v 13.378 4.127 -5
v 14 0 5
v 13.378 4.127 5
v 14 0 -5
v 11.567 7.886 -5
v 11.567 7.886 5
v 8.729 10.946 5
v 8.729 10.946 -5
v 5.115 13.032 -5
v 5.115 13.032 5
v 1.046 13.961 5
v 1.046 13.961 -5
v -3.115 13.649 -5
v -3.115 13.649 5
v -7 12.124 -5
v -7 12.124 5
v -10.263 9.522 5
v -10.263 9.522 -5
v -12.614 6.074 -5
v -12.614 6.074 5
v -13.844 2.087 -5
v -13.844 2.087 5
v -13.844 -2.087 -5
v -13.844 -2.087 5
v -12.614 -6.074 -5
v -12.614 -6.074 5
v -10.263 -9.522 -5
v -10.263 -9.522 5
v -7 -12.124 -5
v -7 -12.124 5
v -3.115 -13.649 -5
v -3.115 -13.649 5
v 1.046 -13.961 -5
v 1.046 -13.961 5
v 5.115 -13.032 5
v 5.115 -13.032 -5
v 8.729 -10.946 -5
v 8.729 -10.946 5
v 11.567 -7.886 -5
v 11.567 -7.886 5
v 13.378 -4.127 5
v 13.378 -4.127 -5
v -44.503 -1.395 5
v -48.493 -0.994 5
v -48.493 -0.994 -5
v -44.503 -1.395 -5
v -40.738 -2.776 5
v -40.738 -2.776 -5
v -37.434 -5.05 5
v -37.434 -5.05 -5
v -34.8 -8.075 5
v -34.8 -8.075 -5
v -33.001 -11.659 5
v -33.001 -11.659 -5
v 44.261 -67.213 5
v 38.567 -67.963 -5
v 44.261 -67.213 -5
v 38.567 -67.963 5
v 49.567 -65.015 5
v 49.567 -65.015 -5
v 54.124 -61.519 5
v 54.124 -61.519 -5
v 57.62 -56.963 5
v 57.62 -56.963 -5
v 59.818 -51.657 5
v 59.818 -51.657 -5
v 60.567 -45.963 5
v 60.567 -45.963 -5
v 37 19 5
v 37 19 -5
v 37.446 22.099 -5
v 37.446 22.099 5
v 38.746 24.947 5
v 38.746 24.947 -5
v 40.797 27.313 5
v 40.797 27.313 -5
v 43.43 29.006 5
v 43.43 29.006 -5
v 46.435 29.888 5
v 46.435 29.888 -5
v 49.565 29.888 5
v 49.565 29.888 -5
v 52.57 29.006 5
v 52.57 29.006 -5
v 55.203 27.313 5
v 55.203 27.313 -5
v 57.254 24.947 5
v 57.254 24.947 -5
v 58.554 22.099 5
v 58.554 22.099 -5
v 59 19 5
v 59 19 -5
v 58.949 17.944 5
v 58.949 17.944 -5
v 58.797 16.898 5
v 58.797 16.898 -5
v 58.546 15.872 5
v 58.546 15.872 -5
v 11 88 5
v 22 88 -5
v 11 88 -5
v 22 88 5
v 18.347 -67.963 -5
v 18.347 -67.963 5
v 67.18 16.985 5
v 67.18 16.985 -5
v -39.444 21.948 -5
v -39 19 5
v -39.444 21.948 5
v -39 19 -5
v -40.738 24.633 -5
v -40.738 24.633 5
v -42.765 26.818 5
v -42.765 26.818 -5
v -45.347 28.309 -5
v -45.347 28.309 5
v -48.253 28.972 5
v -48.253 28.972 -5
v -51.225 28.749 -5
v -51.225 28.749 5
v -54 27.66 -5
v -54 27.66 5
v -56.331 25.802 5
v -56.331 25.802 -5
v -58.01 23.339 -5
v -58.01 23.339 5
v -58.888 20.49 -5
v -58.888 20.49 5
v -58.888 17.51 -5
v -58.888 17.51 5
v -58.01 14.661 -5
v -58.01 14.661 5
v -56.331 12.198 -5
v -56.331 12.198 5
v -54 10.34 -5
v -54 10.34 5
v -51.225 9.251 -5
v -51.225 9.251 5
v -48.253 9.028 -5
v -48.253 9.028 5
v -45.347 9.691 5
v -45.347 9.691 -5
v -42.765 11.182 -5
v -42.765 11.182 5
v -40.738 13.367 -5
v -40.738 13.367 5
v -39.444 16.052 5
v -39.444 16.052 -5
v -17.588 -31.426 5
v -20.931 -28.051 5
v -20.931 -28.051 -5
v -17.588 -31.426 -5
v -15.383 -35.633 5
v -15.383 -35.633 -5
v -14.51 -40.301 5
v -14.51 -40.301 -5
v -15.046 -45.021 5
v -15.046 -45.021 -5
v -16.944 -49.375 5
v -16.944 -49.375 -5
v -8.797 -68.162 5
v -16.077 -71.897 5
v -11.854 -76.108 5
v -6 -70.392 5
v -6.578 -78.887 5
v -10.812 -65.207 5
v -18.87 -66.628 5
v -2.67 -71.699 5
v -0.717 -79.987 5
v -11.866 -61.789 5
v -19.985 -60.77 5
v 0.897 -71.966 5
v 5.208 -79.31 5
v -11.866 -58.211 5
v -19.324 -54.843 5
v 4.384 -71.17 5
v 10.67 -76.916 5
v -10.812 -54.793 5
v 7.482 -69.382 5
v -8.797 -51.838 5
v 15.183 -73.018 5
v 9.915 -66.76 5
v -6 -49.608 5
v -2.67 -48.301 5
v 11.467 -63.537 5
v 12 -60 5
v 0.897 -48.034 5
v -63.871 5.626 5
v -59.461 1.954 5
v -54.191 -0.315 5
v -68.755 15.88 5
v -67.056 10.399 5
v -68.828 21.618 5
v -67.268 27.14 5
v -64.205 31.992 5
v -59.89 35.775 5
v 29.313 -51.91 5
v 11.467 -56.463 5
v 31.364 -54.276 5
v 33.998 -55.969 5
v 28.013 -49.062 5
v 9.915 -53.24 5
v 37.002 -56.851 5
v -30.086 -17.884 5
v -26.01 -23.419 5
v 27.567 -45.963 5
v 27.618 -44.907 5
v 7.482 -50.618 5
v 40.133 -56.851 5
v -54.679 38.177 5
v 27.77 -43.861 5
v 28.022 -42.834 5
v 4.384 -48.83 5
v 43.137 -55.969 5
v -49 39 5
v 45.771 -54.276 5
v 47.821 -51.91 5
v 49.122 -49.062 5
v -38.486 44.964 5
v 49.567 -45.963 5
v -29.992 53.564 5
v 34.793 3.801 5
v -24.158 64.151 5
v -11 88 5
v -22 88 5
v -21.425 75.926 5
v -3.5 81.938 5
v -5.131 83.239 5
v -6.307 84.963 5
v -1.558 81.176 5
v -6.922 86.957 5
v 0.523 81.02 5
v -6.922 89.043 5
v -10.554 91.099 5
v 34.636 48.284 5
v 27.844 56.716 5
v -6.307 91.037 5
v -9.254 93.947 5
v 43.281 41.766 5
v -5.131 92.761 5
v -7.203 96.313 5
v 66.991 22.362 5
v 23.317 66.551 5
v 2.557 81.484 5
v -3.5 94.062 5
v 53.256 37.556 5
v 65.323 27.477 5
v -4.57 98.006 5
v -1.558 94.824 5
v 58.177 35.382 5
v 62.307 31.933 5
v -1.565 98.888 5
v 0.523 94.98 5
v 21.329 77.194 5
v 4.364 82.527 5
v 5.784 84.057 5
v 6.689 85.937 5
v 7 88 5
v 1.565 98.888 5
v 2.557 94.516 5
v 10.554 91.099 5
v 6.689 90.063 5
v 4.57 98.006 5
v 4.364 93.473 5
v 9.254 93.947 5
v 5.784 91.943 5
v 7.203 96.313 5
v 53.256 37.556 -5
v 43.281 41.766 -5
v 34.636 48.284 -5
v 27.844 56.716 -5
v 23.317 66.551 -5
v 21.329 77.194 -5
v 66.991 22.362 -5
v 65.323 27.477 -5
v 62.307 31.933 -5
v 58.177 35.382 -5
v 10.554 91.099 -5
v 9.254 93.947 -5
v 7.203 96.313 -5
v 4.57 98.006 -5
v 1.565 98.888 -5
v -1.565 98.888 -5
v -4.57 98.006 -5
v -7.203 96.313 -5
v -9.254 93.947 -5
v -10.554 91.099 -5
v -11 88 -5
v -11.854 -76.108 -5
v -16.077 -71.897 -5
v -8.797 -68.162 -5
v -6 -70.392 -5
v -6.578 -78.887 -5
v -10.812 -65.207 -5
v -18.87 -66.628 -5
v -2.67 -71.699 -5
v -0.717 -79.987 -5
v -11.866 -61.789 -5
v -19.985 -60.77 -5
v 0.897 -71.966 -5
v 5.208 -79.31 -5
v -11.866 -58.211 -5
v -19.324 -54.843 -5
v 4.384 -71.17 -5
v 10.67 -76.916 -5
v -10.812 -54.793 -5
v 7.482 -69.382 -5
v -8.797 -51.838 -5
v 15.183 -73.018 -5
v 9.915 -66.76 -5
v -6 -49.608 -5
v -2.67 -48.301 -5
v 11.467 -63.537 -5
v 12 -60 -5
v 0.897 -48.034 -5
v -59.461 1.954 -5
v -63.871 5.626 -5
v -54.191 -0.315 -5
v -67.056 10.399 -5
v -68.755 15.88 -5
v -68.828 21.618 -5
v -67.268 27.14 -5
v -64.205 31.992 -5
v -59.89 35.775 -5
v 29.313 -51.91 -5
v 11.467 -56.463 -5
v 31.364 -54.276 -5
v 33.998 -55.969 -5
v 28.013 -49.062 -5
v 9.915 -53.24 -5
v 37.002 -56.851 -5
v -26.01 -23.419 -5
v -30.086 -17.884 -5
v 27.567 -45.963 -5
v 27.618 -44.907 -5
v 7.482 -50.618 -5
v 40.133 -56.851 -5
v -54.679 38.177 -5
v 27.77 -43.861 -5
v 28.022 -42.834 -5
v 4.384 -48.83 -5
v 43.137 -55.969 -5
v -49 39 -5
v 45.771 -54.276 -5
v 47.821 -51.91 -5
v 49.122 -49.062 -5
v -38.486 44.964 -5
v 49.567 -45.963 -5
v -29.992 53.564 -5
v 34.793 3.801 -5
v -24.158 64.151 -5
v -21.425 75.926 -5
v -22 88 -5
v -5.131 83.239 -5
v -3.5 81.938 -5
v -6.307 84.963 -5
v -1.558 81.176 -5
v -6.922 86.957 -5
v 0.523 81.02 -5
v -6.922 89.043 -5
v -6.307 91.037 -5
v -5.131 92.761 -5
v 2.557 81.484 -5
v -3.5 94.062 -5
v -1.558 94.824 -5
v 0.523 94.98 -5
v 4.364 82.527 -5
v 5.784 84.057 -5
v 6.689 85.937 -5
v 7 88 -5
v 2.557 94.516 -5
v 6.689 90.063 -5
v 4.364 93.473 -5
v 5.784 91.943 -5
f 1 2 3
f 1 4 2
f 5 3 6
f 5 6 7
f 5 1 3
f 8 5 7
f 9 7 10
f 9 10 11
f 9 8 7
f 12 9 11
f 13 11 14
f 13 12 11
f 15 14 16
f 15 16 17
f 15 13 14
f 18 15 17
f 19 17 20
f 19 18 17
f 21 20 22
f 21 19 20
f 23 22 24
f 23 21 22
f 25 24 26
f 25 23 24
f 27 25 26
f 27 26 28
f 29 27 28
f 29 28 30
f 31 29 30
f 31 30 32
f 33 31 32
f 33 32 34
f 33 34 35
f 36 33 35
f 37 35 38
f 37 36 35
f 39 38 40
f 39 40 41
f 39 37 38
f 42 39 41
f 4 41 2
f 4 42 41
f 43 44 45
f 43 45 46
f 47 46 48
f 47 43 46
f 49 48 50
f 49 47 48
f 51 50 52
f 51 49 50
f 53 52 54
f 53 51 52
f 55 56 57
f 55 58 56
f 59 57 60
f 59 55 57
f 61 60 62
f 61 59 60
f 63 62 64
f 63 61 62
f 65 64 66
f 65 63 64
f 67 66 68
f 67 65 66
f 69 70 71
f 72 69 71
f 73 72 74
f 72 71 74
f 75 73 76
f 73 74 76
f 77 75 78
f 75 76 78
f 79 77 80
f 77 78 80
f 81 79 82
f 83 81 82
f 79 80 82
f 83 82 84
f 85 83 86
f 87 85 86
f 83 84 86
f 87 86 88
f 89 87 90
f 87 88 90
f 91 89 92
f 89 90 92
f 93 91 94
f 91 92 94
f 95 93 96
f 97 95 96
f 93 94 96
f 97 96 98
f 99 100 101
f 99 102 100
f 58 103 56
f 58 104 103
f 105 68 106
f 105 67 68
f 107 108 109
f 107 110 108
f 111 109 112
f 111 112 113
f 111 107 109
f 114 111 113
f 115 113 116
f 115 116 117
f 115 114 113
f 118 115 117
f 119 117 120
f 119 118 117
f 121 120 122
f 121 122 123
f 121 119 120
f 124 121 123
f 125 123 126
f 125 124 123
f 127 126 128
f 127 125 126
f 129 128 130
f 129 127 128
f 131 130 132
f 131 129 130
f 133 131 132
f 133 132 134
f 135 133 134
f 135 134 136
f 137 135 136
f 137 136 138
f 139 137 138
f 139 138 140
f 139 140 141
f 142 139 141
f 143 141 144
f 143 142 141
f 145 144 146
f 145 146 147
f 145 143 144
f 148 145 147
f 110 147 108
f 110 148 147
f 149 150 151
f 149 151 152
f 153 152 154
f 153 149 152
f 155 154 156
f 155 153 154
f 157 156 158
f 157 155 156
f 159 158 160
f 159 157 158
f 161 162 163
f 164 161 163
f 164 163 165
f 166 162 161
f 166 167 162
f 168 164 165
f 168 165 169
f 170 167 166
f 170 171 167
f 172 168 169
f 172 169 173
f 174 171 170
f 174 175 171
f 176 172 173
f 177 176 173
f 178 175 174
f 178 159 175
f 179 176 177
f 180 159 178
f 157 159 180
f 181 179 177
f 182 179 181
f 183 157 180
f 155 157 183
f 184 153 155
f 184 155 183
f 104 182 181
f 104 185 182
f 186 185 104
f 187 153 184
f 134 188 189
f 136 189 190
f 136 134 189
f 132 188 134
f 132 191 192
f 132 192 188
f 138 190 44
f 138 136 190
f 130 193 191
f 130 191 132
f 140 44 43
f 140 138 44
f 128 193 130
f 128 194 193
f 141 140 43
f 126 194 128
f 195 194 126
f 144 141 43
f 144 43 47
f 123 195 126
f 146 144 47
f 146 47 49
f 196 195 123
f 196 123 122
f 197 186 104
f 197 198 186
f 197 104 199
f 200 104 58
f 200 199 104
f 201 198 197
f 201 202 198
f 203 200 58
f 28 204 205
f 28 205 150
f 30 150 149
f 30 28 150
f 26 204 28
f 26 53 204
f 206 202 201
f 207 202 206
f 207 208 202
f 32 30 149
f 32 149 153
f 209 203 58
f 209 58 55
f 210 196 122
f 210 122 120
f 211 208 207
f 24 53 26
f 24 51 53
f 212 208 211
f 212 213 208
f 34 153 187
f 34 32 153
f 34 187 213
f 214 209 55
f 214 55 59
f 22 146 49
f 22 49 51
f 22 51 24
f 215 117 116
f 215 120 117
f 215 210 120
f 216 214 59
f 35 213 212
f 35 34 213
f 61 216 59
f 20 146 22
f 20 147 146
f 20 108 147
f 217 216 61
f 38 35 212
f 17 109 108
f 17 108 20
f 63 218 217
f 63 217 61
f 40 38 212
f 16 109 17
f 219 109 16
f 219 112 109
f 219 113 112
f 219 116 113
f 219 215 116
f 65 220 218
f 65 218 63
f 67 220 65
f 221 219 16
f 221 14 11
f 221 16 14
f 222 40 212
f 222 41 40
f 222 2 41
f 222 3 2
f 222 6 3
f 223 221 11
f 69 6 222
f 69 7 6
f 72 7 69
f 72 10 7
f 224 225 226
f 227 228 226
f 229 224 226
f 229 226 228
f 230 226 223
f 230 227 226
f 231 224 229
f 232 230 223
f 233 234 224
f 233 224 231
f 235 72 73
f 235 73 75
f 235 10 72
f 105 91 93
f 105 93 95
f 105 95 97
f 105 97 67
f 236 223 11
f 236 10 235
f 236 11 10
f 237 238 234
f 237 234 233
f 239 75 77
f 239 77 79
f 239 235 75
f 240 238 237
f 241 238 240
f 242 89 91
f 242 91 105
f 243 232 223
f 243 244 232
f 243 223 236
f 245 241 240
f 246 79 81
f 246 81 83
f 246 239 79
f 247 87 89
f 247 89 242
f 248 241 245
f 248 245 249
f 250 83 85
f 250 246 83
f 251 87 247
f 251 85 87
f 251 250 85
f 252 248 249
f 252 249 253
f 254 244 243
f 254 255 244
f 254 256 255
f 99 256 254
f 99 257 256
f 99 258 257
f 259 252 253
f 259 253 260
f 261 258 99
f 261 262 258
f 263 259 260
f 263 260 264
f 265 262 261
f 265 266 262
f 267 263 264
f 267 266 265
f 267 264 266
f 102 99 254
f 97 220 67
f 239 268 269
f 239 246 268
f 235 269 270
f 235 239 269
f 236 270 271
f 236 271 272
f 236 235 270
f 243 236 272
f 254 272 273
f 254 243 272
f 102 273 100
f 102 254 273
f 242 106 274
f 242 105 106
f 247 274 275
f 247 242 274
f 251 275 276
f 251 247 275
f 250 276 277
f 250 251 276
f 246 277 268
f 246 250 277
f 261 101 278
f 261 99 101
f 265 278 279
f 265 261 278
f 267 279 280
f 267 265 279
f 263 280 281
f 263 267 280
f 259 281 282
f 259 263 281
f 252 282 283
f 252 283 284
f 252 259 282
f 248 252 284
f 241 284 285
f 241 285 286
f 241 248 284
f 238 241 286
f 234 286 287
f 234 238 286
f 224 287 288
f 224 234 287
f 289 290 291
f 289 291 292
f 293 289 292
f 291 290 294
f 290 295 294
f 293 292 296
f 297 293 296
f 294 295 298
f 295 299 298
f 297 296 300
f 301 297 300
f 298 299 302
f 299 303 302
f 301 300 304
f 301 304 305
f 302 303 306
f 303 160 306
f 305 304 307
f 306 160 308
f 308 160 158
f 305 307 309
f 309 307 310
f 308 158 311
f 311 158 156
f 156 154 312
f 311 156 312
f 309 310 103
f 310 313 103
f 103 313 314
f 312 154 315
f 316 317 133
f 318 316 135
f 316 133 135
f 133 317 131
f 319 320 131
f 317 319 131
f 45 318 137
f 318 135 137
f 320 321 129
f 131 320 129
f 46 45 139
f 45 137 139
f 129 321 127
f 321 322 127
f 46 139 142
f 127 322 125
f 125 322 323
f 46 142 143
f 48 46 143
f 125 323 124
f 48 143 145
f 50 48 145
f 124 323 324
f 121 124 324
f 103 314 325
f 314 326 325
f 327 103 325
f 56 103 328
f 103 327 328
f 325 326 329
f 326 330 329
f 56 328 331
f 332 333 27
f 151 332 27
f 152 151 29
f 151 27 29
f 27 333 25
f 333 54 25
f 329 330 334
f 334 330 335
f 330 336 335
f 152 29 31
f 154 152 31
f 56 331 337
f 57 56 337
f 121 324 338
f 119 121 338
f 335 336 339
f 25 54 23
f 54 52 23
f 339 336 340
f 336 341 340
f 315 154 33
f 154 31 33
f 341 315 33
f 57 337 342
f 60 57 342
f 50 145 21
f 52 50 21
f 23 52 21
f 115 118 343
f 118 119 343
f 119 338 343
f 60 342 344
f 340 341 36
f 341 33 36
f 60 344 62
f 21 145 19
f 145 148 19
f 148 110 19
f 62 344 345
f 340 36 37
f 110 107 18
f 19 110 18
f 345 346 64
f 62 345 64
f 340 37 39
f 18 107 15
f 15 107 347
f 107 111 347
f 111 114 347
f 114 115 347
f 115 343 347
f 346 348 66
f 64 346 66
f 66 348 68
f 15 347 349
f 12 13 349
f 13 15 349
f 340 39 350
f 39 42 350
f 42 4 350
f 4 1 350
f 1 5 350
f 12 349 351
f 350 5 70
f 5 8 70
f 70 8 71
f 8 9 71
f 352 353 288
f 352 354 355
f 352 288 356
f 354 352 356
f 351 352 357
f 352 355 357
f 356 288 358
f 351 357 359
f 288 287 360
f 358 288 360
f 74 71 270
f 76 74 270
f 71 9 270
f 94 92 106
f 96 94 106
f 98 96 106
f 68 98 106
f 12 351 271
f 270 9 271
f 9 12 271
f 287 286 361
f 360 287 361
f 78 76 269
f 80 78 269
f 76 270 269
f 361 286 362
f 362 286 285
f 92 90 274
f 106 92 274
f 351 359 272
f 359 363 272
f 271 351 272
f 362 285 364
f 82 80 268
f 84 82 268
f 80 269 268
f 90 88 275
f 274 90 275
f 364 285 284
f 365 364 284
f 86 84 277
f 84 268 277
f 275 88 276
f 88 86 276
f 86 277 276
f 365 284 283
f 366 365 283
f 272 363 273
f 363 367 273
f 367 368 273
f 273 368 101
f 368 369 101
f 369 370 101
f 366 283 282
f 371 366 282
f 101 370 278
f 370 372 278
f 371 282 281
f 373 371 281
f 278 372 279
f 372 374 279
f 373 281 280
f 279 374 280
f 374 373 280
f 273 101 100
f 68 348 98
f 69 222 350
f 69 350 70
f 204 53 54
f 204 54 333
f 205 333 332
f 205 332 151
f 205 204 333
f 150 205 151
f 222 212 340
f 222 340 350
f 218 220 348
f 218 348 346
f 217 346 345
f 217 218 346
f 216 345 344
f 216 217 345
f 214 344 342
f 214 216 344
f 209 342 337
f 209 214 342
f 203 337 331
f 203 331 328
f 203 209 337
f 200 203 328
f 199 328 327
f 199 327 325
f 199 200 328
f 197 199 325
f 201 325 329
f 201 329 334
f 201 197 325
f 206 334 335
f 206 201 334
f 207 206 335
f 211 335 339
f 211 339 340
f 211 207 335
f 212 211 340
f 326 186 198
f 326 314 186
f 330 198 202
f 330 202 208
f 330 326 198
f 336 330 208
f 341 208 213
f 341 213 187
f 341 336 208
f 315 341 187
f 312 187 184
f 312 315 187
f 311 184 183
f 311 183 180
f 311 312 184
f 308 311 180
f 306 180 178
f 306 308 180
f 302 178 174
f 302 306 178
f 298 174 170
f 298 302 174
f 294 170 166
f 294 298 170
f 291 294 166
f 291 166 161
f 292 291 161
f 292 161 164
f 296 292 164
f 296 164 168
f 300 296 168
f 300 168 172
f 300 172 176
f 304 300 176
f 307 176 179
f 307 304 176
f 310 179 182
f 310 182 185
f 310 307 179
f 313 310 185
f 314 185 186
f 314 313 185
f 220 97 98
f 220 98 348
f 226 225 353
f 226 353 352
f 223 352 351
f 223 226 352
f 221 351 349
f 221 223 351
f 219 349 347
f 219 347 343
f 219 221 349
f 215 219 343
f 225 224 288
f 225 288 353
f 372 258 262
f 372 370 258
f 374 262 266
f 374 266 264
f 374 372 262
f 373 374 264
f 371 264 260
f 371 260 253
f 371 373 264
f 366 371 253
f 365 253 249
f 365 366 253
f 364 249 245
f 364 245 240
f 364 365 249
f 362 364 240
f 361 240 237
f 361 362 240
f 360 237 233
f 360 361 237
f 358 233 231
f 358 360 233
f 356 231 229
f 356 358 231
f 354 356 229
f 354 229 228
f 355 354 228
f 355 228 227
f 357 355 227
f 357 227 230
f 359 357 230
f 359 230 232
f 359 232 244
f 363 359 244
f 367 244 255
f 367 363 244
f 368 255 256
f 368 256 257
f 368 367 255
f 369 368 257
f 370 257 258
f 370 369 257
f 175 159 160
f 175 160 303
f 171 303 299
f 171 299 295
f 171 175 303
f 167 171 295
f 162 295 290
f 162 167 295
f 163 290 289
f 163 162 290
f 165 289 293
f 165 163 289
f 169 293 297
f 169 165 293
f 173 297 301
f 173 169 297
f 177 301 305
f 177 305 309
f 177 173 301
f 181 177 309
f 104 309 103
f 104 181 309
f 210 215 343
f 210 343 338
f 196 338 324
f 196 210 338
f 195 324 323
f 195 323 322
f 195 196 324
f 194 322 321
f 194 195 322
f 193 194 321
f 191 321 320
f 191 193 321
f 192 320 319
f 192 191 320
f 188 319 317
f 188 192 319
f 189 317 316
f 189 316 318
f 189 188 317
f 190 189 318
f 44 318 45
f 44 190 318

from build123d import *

# Parameters (mm, degrees)
SKETCH1_R           = 12
SKETCH1_R_2         = 14
SKETCH1_R_3         = 10
SKETCH1_R_4         = 7
BOSS_EXTRUDE1_DEPTH = 5


with BuildPart() as part:
    # Sketch1 → Boss-Extrude1 (new, symmetric)
    with BuildSketch(Plane.XY):
        with BuildLine():
            ThreePointArc((11, 88), (0, 99), (-11, 88))
            Line((-11, 88), (-22, 88))
            ThreePointArc((-22, 88), (-26.70940007, 58.656200039), (-49, 39))
            ThreePointArc((-49, 39), (-68.998392946, 18.746465817), (-48.492972379, -0.993572042))
            ThreePointArc((-48.492972379, -0.993572042), (-39.014510451, -3.809523143), (-33.001122743, -11.658726248))
            ThreePointArc((-33.001122743, -11.658726248), (-28.18429152, -20.752004999), (-20.931196761, -28.051470588))
            ThreePointArc((-20.931196761, -28.051470588), (-14.77228566, -37.934411824), (-16.94430214, -49.375))
            ThreePointArc((-16.94430214, -49.375), (-9.320242105, -77.695566877), (18.346551197, -67.962666587))
            Line((18.346551197, -67.962666587), (38.567256581, -67.962666587))
            ThreePointArc((38.567256581, -67.962666587), (54.123605767, -61.519015773), (60.567256581, -45.962666587))
            Line((60.567256581, -45.962666587), (67.180494628, 16.984907625))
            ThreePointArc((67.180494628, 16.984907625), (63.971087494, 29.810935932), (53.255704219, 37.556118792))
            ThreePointArc((53.255704219, 37.556118792), (27.844090476, 56.715909688), (22, 88))
            Line((22, 88), (11, 88))
        make_face()
        with Locations((0, -60)):
            Circle(SKETCH1_R, mode=Mode.SUBTRACT)
        Circle(SKETCH1_R_2, mode=Mode.SUBTRACT)
        with BuildLine():
            Line((34.793024979, 3.800712147), (37, 19))
            ThreePointArc((37, 19), (48, 30), (59, 19))
            ThreePointArc((59, 19), (58.885841276, 17.419348327), (58.545734598, 15.871504867))
            Line((58.545734598, 15.871504867), (49.567256581, -45.962666587))
            ThreePointArc((49.567256581, -45.962666587), (38.567256581, -56.962666587), (27.567256581, -45.962666587))
            ThreePointArc((27.567256581, -45.962666587), (27.681415305, -44.382014914), (28.021521984, -42.834171454))
            Line((28.021521984, -42.834171454), (34.793024979, 3.800712147))
        make_face(mode=Mode.SUBTRACT)
        with Locations((-49, 19)):
            Circle(SKETCH1_R_3, mode=Mode.SUBTRACT)
        with Locations((0, 88)):
            Circle(SKETCH1_R_4, mode=Mode.SUBTRACT)
    extrude(amount=BOSS_EXTRUDE1_DEPTH, both=True)


solid = part.part
